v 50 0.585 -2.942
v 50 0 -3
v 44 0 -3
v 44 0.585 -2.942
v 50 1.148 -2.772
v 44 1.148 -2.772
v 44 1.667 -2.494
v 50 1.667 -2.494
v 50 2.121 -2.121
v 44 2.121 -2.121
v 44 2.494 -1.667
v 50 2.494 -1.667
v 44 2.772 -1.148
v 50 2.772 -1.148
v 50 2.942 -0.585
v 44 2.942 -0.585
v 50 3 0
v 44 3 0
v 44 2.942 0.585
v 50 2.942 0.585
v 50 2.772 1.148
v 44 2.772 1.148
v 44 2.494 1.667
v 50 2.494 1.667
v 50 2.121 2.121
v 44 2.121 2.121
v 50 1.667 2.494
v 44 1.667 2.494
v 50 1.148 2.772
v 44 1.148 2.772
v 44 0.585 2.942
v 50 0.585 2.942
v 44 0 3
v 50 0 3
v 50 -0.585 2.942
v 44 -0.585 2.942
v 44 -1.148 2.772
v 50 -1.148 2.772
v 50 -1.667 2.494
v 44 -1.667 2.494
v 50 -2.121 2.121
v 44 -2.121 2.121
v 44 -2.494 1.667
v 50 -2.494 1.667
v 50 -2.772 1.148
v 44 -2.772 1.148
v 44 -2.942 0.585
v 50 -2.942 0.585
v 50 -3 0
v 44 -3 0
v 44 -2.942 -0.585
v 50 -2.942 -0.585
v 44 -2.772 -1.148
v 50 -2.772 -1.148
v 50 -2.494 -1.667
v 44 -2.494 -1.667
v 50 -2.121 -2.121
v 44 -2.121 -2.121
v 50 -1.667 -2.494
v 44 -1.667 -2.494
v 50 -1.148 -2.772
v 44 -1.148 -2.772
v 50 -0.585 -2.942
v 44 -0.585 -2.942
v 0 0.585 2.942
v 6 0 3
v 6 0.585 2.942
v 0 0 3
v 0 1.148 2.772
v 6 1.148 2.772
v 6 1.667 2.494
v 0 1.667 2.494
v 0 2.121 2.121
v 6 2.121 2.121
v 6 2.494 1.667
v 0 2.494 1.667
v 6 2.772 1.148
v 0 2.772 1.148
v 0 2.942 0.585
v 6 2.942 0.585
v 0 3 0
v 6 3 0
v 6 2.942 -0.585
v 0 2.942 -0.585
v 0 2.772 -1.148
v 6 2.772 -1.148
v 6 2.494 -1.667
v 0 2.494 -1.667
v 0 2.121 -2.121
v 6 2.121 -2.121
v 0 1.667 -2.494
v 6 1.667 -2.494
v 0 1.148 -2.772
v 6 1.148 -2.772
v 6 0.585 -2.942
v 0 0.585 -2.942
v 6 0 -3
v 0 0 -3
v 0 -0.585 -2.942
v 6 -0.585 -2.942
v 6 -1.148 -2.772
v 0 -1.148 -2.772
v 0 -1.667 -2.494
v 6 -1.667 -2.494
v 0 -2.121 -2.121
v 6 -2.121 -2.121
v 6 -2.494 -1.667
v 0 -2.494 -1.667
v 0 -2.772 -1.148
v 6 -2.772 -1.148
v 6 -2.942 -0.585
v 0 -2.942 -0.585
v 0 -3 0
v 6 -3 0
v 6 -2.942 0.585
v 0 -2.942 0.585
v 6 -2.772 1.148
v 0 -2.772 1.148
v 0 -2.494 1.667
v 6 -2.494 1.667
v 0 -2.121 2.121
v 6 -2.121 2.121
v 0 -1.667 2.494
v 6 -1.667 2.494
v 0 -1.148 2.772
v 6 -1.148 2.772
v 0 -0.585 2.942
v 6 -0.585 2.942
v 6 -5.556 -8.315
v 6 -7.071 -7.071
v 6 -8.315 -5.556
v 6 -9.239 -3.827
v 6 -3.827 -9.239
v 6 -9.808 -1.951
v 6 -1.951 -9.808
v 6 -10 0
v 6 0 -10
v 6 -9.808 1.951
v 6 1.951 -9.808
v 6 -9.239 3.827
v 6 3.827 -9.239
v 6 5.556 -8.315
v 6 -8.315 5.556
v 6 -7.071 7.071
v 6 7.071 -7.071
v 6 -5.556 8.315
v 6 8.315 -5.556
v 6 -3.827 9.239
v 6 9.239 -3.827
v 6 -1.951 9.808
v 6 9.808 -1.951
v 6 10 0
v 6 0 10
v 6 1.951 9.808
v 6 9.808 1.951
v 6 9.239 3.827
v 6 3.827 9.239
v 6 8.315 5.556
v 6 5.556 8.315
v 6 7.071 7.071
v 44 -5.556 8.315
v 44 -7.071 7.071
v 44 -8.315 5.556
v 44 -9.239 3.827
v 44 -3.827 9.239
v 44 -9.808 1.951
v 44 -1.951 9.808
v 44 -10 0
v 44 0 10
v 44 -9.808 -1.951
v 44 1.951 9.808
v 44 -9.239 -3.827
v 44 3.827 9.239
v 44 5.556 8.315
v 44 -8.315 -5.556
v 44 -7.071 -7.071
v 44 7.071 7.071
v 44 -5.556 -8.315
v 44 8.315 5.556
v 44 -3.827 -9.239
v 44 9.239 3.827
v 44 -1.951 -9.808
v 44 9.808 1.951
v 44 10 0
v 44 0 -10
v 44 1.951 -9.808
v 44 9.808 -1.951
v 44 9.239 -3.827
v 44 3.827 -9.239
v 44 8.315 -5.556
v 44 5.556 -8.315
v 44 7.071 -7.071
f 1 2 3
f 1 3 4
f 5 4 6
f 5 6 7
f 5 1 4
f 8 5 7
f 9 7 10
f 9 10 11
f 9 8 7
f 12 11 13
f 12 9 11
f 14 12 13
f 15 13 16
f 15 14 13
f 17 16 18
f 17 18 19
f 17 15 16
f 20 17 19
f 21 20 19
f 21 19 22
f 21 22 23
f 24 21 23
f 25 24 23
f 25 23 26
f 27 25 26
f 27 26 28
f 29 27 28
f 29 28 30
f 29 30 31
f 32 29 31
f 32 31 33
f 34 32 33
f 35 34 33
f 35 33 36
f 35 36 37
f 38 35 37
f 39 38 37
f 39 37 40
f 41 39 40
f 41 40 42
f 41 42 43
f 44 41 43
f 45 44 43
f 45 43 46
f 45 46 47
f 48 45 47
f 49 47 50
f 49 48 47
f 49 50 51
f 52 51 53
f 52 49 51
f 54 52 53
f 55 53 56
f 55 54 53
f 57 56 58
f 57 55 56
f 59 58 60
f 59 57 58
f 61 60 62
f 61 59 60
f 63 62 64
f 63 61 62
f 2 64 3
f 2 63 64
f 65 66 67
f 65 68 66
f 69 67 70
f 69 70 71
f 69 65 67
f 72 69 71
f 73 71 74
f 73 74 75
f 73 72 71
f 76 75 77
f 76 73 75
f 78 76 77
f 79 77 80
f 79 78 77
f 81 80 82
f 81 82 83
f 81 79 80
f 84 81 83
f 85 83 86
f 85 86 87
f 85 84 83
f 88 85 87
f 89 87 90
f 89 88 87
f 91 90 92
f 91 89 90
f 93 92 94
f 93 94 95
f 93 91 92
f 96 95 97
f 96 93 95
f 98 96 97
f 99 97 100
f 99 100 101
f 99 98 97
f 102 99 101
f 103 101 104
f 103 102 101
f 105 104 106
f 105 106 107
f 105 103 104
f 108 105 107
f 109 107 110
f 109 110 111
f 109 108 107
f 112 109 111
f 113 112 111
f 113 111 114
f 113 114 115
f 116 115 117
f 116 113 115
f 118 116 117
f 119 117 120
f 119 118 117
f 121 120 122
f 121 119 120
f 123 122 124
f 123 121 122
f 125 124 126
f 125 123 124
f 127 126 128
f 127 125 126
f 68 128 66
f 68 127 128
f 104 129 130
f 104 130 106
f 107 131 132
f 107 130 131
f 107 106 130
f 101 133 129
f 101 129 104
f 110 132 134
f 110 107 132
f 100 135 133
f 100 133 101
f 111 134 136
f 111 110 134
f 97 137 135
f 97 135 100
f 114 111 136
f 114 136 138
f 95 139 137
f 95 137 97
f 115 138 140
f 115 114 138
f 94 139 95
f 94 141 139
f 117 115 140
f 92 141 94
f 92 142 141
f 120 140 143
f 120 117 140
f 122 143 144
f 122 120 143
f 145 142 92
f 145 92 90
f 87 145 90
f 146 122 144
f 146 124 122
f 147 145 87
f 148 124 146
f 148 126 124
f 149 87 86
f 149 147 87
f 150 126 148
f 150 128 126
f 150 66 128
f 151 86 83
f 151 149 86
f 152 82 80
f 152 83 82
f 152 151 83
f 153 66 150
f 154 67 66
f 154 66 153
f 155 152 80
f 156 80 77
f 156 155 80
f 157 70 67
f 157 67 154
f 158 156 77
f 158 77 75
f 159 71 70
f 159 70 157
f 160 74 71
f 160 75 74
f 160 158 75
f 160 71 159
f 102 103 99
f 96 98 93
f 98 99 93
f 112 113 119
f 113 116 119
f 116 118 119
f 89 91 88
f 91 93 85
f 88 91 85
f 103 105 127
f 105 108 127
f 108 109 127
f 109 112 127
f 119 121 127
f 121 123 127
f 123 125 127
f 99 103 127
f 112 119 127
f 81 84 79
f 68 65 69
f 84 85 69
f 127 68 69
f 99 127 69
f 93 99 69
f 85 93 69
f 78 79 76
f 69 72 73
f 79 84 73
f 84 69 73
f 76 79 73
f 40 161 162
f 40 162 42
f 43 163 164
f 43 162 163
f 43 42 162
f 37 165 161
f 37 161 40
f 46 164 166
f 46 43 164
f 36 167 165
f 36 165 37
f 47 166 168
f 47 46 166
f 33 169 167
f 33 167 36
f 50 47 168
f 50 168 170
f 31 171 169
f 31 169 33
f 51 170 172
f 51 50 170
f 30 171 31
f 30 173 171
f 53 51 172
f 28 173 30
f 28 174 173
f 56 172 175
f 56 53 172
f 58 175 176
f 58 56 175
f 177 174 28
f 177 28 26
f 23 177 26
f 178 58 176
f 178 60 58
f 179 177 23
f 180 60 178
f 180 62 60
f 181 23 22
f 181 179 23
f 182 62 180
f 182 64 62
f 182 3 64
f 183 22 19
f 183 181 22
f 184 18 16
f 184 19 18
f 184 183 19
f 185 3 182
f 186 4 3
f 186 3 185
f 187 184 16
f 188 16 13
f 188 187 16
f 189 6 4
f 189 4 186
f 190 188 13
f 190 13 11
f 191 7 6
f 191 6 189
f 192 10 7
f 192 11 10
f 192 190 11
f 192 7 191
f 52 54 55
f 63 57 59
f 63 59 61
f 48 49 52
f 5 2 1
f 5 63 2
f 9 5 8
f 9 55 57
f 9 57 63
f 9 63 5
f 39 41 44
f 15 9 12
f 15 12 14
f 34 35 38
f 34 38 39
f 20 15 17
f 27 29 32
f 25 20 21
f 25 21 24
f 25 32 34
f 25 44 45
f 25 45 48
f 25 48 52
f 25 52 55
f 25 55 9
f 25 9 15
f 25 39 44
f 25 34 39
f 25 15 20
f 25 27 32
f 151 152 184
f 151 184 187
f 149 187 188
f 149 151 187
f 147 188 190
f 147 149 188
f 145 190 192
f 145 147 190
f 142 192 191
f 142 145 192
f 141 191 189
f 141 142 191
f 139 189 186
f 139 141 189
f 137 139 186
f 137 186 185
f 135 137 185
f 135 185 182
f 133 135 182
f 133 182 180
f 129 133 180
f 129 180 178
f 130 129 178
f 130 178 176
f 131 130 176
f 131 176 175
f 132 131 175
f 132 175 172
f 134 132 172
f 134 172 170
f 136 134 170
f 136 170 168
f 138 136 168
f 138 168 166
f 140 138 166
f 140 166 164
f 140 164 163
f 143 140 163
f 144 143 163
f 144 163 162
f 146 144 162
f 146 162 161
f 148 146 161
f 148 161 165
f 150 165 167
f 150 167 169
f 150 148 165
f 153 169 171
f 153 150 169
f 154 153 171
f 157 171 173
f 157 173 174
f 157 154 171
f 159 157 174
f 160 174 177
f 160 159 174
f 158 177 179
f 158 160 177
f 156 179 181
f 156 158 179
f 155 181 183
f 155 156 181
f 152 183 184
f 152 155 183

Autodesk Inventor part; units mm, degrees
ref_plane "YZ Plane" through (0, 0, 0) normal (1, 0, 0) x (0, 1, 0)
ref_plane "XZ Plane" through (0, 0, 0) normal (0, 1, 0) x (-1, 0, 0)
ref_plane "XY Plane" through (0, 0, 0) normal (0, 0, 1) x (1, 0, 0)
sketch "Sketch1" plane through (0, 0, 0) normal (1, 0, 0) x (0, 1, 0)
  circle A0 centre (0, 0) radius 10
  dimension "d0" = 20
extrude "Extrusion1" add sketch "Sketch1" along normal blind 50
sketch "Sketch2" plane through (50, 0, 0) normal (1, 0, 0) x (0, 0, -1)
  circle A0 centre (0, 0) radius 10
  circle A1 centre (0, 0) radius 3
  dimension "d3" = 20
  dimension "d4" = 6
extrude "Extrusion2" cut sketch "Sketch2" against normal blind 6
sketch "Sketch3" plane through (0, 0, 0) normal (-1, 0, 0) x (0, 0, 1)
  circle A0 centre (0, 0) radius 10 projected
  circle A1 centre (0, 0) radius 10
  circle A2 centre (0, 0) radius 3
  dimension "d7" = 20
  dimension "d8" = 6
extrude "Extrusion3" cut sketch "Sketch3" against normal blind 6
properties part number "roller"
